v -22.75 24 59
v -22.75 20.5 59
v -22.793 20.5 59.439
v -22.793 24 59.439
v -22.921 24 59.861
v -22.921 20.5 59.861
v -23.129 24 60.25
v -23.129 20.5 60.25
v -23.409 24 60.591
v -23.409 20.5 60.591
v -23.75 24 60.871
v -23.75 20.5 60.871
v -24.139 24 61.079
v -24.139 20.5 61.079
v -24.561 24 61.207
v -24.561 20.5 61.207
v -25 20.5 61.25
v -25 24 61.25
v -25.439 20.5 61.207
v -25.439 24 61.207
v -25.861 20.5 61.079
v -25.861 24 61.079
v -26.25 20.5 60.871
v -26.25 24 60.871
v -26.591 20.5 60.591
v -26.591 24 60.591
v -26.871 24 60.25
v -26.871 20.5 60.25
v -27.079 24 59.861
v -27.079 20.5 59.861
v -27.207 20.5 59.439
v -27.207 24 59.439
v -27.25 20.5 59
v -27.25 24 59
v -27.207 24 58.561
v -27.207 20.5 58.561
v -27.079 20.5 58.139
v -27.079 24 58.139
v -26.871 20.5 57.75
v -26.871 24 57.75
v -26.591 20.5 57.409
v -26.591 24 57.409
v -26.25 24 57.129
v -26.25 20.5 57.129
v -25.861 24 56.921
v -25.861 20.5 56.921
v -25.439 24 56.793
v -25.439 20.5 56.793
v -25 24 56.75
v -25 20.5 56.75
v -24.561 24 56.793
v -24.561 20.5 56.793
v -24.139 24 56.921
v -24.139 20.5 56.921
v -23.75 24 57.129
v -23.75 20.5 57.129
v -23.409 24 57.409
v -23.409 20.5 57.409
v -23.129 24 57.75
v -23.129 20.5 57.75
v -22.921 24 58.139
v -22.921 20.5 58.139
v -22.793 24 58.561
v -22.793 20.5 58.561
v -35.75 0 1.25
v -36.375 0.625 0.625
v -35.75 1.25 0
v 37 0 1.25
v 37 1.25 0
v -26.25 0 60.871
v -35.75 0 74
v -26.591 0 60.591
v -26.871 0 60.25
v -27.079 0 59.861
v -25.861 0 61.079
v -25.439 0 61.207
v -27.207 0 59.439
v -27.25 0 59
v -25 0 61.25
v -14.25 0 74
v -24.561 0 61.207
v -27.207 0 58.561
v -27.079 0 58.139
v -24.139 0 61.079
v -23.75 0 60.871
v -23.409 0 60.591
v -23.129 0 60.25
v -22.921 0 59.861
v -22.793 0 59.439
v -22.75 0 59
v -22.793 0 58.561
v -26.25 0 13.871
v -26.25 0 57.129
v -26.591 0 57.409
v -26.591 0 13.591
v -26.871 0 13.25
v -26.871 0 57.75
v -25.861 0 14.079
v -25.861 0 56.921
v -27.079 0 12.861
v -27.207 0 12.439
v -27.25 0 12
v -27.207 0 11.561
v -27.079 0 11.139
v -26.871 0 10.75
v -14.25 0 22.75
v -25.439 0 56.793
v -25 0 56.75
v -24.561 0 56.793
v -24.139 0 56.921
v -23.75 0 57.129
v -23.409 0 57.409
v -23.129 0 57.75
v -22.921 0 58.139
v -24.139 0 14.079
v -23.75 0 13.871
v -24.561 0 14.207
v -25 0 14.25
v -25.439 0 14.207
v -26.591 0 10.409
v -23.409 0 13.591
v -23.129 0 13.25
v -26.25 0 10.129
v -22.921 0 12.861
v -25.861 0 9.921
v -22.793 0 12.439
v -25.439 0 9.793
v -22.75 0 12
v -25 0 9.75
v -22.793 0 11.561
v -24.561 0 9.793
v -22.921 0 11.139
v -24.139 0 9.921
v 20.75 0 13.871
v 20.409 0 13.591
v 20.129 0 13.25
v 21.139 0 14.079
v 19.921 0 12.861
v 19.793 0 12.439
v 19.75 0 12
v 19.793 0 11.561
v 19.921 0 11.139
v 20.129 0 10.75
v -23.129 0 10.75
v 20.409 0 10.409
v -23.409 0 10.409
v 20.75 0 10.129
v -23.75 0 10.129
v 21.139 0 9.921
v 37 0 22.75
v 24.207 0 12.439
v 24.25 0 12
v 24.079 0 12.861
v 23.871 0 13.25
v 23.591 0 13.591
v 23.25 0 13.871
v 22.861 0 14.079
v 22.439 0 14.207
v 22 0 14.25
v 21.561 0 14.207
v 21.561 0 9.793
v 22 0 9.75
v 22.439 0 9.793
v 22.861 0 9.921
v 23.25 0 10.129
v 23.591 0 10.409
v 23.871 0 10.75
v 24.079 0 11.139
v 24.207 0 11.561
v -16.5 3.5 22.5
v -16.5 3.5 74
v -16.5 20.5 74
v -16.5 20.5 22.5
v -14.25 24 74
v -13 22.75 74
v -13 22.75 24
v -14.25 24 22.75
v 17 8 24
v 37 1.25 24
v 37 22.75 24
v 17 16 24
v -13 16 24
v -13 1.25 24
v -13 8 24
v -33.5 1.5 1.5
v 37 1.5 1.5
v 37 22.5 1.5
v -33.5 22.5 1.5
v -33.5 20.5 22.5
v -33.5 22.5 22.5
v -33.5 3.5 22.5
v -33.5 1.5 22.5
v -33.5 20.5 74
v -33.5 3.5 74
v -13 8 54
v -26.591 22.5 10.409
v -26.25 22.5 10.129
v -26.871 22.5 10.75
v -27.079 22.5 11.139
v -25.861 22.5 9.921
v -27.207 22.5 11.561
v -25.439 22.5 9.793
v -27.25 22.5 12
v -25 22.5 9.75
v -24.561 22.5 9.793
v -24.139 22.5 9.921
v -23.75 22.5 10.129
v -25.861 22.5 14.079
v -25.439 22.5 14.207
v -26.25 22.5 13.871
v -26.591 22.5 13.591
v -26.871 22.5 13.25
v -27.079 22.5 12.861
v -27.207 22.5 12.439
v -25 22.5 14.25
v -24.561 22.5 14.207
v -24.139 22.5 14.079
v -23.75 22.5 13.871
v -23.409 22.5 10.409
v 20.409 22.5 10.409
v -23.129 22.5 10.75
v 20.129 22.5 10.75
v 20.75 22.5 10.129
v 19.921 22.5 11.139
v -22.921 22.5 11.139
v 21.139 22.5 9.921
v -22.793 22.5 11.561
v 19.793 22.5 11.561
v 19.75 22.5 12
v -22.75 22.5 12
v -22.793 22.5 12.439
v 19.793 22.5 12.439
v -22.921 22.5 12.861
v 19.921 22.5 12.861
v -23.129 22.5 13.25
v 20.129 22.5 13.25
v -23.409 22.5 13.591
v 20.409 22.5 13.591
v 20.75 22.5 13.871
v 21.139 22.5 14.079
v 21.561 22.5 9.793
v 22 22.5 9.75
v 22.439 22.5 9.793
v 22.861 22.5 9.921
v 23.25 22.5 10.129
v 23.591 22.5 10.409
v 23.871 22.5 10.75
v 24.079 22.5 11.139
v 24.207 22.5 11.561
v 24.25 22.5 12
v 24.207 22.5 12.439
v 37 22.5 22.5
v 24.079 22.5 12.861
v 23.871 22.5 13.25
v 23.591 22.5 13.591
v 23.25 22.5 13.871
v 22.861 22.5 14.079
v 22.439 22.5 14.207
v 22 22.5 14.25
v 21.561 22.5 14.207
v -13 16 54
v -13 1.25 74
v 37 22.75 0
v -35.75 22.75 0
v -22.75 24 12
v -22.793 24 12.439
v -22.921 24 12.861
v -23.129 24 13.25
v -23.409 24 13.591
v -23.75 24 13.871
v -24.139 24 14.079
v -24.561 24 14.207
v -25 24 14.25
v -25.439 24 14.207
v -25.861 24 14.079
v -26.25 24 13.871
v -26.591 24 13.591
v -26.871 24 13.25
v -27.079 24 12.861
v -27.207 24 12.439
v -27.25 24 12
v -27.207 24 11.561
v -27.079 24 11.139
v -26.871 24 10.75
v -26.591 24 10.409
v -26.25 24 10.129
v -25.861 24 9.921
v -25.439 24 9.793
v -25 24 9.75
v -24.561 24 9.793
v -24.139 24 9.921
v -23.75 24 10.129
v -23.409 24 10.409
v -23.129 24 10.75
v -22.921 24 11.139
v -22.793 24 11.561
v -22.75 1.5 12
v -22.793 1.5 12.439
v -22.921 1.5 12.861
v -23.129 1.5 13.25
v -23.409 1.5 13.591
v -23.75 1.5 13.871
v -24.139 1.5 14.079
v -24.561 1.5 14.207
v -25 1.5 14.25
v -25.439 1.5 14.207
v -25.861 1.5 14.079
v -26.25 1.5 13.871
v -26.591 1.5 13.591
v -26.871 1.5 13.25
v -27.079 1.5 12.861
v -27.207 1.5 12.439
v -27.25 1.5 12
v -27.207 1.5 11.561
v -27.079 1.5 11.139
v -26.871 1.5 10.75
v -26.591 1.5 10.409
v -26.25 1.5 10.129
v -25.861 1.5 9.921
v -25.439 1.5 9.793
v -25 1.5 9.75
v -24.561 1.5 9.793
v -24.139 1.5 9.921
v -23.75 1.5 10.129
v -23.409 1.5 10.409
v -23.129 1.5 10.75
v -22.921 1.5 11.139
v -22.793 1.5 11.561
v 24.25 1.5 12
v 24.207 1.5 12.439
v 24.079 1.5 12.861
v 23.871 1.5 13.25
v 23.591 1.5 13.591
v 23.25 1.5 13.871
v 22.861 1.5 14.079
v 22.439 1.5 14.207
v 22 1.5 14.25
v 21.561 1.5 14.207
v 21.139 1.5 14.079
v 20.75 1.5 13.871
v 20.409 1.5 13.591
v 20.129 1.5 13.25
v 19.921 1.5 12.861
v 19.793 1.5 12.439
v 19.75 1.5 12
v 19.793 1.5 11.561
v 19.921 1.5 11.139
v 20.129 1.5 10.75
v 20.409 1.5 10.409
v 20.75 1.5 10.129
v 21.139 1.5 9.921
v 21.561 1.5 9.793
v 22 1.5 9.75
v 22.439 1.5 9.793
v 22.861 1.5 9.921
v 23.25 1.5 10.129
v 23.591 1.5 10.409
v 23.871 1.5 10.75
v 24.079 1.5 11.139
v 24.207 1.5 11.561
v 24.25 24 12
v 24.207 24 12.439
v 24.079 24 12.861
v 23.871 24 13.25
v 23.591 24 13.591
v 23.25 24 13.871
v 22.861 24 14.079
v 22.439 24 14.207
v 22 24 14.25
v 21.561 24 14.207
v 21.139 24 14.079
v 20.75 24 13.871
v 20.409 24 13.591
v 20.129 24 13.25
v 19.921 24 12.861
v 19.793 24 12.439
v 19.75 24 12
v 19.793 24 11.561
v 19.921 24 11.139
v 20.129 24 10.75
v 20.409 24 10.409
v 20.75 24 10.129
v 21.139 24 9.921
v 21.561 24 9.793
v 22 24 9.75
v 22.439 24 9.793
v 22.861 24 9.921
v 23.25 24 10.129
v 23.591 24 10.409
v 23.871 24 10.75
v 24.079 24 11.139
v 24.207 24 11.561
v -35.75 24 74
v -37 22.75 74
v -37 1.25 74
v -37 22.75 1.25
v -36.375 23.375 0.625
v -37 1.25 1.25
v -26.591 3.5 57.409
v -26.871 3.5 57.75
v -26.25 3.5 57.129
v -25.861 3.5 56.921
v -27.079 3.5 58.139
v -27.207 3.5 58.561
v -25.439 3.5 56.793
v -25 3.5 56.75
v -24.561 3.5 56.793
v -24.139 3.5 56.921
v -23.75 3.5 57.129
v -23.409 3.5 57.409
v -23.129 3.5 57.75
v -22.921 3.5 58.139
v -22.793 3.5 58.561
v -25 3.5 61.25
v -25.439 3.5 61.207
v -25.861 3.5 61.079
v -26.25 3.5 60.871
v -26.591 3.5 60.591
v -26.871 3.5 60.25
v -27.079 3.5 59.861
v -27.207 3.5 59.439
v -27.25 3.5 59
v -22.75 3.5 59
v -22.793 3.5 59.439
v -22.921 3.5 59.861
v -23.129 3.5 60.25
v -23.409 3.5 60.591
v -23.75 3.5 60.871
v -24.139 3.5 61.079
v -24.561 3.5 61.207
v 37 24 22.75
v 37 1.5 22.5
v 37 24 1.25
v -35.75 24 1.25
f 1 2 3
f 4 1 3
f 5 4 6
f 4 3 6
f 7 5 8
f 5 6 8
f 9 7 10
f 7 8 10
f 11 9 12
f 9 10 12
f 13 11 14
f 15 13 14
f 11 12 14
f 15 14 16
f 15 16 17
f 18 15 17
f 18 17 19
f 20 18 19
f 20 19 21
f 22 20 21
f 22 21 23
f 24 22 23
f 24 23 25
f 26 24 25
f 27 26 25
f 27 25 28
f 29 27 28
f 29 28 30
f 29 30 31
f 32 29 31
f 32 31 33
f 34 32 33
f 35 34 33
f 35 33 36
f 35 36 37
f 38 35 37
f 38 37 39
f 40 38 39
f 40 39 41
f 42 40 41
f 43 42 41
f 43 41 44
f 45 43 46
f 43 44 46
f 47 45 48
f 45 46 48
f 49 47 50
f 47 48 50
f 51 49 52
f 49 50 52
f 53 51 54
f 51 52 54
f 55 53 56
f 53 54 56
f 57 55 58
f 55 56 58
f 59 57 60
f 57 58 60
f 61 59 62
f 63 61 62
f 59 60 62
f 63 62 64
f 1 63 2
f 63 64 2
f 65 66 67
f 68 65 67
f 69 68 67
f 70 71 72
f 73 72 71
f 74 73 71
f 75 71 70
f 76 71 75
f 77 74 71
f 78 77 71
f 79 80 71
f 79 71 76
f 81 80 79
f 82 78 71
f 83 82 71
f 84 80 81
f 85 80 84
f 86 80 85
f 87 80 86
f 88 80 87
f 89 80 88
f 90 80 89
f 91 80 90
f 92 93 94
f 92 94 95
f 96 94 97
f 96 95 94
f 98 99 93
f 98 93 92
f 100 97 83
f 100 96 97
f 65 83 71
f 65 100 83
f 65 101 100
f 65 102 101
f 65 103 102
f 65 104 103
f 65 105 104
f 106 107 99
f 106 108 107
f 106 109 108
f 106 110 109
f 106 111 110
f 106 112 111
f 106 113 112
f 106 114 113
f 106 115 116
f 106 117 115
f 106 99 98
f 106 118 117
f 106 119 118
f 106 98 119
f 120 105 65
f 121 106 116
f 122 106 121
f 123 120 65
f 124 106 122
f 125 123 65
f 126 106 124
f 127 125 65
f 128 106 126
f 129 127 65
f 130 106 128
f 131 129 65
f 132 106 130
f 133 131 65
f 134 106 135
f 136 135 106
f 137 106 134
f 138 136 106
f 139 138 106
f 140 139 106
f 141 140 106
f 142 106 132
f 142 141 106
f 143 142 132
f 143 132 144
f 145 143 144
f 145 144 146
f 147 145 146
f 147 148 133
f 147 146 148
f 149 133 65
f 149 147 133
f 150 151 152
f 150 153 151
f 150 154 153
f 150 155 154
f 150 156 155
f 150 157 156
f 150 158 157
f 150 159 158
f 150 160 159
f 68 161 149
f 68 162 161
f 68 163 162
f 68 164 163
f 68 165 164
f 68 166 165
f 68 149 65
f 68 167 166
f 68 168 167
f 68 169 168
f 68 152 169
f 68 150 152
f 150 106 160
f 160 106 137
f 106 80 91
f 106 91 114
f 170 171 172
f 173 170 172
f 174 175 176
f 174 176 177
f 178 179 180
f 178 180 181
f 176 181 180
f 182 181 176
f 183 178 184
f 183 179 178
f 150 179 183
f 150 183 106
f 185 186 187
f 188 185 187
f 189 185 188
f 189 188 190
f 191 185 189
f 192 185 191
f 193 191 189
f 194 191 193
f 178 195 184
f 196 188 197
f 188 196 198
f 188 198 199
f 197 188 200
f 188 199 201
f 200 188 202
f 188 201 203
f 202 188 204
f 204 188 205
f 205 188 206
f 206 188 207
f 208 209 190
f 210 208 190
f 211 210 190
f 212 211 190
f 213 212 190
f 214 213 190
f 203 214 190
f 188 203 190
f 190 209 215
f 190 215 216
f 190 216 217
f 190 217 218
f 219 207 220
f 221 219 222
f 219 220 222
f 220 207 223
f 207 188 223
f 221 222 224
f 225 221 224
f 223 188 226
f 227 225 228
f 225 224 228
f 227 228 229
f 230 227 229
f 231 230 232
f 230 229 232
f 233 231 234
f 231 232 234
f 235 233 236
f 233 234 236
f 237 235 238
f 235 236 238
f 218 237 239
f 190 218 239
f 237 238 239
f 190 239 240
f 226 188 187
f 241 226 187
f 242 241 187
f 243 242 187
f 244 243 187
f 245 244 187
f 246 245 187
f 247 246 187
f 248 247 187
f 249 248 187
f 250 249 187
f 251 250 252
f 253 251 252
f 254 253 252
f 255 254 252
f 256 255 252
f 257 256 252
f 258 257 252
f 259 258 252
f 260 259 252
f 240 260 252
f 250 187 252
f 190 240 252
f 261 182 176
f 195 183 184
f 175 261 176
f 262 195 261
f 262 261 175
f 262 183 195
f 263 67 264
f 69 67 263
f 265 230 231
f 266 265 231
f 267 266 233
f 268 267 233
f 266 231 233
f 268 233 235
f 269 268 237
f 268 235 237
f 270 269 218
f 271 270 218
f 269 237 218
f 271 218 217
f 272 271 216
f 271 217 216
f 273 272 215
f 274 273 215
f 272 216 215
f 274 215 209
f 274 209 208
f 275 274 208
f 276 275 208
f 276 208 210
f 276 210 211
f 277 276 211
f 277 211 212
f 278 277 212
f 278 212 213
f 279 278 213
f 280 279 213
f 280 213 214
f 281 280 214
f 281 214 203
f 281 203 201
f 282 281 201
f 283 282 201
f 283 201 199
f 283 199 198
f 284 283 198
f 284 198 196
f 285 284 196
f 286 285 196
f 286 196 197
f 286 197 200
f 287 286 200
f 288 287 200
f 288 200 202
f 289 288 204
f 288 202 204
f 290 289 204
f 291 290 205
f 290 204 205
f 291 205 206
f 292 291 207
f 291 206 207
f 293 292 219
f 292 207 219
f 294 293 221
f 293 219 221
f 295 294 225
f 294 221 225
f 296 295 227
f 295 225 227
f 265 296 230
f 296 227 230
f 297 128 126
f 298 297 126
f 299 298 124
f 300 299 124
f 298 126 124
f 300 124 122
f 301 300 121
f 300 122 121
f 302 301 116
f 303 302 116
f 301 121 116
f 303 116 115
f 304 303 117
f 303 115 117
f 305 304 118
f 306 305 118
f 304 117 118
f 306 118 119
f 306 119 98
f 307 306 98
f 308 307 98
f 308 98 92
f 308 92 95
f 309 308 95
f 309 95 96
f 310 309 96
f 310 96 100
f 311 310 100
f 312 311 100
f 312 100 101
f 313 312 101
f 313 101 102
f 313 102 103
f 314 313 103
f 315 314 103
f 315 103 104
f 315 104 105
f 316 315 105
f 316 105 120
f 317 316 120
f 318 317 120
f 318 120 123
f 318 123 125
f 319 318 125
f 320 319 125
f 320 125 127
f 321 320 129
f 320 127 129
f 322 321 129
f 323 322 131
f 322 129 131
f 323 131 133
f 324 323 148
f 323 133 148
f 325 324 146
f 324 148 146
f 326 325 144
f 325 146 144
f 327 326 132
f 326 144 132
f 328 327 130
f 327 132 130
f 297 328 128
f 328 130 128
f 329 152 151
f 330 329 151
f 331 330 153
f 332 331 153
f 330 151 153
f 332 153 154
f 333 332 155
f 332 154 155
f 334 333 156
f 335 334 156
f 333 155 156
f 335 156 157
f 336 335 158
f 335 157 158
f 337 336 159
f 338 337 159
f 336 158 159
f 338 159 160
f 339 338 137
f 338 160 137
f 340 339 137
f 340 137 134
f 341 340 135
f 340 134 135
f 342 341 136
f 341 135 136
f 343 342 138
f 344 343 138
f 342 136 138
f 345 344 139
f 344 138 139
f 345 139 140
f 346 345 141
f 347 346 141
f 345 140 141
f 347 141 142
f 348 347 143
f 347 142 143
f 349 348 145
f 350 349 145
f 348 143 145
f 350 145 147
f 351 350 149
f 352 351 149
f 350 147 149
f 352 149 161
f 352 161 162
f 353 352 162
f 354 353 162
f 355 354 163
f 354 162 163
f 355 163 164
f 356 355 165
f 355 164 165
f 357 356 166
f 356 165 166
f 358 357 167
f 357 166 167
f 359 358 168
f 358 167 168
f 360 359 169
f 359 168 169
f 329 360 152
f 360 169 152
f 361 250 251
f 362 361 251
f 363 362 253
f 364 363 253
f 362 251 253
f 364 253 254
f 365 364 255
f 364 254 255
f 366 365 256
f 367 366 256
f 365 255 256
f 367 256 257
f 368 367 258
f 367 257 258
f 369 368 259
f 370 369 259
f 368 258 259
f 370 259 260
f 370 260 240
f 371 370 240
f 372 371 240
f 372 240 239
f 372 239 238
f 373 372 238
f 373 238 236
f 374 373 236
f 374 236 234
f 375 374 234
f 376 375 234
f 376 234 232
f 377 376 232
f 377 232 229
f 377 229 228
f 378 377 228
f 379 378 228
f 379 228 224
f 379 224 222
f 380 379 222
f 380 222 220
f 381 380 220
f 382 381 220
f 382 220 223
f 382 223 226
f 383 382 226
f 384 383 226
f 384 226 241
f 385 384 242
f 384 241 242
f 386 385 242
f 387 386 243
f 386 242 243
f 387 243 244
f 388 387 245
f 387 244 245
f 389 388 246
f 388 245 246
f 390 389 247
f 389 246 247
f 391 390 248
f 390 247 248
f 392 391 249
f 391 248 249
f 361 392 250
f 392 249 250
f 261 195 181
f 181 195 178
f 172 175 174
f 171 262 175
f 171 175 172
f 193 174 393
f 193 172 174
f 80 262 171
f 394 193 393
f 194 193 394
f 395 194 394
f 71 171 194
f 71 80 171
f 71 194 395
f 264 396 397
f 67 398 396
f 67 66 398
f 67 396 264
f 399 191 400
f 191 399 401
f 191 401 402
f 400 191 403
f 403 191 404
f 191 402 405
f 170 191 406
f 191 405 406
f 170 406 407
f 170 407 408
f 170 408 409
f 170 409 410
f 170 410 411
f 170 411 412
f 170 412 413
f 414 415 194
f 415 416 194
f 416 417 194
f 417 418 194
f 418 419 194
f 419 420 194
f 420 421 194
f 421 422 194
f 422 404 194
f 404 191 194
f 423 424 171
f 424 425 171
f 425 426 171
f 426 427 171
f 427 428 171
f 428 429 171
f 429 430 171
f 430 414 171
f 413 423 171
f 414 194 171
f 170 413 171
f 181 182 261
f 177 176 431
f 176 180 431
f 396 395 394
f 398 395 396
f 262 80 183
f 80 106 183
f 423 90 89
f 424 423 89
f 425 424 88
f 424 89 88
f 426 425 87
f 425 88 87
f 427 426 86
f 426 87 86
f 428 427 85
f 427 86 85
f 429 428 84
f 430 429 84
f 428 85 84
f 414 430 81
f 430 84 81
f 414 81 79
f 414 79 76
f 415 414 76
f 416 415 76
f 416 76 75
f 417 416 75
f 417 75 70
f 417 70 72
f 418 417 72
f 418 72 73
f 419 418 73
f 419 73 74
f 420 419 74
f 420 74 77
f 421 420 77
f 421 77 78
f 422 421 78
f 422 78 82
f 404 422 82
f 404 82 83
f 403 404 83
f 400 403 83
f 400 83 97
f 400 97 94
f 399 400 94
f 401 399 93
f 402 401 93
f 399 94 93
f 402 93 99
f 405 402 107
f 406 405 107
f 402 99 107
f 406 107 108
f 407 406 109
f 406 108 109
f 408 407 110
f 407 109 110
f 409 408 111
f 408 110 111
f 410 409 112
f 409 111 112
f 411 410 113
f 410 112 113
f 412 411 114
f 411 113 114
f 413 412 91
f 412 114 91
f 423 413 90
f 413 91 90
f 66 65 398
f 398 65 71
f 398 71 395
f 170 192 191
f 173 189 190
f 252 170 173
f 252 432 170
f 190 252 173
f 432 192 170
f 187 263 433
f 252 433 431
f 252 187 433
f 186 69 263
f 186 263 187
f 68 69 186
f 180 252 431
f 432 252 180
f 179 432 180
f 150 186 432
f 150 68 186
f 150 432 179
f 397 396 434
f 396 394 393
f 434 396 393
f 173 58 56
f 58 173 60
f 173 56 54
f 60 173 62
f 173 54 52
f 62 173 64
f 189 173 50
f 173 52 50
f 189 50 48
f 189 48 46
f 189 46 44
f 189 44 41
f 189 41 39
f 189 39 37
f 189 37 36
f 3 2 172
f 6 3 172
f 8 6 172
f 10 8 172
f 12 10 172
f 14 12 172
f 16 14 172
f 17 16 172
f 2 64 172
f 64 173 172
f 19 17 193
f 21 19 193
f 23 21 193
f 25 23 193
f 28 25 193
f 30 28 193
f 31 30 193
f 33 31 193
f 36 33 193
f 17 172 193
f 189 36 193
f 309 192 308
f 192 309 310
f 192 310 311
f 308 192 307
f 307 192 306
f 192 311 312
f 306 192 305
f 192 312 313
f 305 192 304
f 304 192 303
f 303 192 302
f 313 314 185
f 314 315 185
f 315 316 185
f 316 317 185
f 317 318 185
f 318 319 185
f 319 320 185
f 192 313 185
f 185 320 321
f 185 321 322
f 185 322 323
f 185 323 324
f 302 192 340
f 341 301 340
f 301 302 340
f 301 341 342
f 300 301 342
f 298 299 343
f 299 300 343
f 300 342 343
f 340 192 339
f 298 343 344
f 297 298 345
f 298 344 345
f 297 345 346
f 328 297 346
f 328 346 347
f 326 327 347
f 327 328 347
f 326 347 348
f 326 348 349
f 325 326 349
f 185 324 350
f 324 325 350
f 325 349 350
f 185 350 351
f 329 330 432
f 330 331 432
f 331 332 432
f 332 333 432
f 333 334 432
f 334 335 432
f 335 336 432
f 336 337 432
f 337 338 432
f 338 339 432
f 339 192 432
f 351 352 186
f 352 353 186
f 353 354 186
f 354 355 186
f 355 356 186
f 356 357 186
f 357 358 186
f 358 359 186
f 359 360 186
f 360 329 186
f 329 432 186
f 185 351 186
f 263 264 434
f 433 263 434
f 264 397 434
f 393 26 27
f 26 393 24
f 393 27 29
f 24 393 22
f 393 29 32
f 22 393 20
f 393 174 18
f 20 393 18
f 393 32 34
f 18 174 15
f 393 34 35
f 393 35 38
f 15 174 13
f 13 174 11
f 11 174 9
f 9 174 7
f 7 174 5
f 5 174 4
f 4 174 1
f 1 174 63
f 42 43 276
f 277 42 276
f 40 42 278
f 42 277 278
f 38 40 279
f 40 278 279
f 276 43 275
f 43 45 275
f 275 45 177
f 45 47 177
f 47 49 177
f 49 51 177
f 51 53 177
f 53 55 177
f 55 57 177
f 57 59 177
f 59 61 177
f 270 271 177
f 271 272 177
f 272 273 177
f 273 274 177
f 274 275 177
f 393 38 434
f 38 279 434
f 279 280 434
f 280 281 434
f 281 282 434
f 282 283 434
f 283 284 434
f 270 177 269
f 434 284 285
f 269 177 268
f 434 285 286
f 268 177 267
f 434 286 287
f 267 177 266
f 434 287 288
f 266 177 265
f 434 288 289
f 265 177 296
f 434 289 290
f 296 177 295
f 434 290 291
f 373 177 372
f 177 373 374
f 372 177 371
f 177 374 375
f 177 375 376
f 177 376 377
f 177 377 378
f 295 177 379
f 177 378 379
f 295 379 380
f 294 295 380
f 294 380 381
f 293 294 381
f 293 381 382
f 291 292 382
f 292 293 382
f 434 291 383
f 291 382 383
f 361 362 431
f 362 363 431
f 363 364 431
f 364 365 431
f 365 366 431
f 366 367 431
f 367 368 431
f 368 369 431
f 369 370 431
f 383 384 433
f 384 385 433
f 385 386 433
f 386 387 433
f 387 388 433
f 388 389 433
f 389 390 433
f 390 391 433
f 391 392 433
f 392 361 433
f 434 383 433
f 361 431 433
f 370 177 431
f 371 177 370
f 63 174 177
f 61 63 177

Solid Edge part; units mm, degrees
sketch "Sketch1" plane through (0, 0, 0) normal (0, -1, 0) x (1, 0, 0)
  line L0 (37, 24) -> (-13, 24)
  line L1 (-13, 24) -> (-13, 74)
  line L2 (-13, 74) -> (-37, 74)
  line L3 (-37, 74) -> (-37, 0)
  line L4 (-37, 0) -> (37, 0)
  line L5 (37, 0) -> (37, 24)
extrude "Protrusion1" add sketch "Sketch1" against normal blind 24
sketch "Sketch2" plane through (-25, 12, 74) normal (0, 0, 1) x (1, 0, 0)
  line L0 (8.5, -8.5) -> (8.5, 8.5)
  line L1 (8.5, 8.5) -> (-8.5, 8.5)
  line L2 (-8.5, 8.5) -> (-8.5, -8.5)
  line L3 (-8.5, -8.5) -> (8.5, -8.5)
extrude "VaciadoExtruido_1" cut sketch "Sketch2" against normal blind 72.5
sketch "Sketch3" plane through (37, 12, 12) normal (1, 0, 0) x (0, 1, 0)
  line L0 (-10.5, 10.5) -> (-10.5, -10.5)
  line L1 (-10.5, -10.5) -> (10.5, -10.5)
  line L2 (10.5, -10.5) -> (10.5, 10.5)
  line L3 (-10.5, 10.5) -> (10.5, 10.5)
extrude "Cutout1" cut sketch "Sketch3" against normal up to surface (70.5 mm away)
sketch "Sketch4" plane through (-13, 12, 49) normal (1, 0, 0) x (0, 0, 1)
  line L0 (25, 4) -> (-25, 4)
  line L1 (-25, 4) -> (-25, -4)
  line L2 (-25, -4) -> (25, -4)
  line L3 (25, 4) -> (25, -4)
extrude "Protrusion2" add sketch "Sketch4" along normal up to surface (50 mm away)
sketch "Sketch5" plane through (12, 8, 49) normal (0, -1, 0) x (0, 0, 1)
  line L0 (5, 25) -> (-25, -5)
  line L1 (-25, -25) -> (-25, -5)
  line L2 (25, -25) -> (-25, -25)
  line L3 (25, 25) -> (25, -25)
  line L4 (5, 25) -> (25, 25)
extrude "Cutout2" cut sketch "Sketch5" against normal through all
chamfer "Chaflán_1" distance 1.25 angle 45 9 edges at (-37, 0, 37) (-37, 24, 37) (-13, 0, 49) (12, 0, 24) (0, 0, 0) (-37, 12, 0) (0, 24, 0) (12, 24, 24) (-13, 24, 49)
sketch "Sketch6" plane through (0.625, 0, 37.625) normal (0, -1, 0) x (1, 0, 0)
  circle A0 centre (-25.625, 21.375) radius 2.25
  circle A1 centre (-25.625, -25.625) radius 2.25
  circle A2 centre (21.375, -25.625) radius 2.25
  dimension "D1" = 15
  dimension "D2" = 15
extrude "Cutout3" cut sketch "Sketch6" against normal through all
